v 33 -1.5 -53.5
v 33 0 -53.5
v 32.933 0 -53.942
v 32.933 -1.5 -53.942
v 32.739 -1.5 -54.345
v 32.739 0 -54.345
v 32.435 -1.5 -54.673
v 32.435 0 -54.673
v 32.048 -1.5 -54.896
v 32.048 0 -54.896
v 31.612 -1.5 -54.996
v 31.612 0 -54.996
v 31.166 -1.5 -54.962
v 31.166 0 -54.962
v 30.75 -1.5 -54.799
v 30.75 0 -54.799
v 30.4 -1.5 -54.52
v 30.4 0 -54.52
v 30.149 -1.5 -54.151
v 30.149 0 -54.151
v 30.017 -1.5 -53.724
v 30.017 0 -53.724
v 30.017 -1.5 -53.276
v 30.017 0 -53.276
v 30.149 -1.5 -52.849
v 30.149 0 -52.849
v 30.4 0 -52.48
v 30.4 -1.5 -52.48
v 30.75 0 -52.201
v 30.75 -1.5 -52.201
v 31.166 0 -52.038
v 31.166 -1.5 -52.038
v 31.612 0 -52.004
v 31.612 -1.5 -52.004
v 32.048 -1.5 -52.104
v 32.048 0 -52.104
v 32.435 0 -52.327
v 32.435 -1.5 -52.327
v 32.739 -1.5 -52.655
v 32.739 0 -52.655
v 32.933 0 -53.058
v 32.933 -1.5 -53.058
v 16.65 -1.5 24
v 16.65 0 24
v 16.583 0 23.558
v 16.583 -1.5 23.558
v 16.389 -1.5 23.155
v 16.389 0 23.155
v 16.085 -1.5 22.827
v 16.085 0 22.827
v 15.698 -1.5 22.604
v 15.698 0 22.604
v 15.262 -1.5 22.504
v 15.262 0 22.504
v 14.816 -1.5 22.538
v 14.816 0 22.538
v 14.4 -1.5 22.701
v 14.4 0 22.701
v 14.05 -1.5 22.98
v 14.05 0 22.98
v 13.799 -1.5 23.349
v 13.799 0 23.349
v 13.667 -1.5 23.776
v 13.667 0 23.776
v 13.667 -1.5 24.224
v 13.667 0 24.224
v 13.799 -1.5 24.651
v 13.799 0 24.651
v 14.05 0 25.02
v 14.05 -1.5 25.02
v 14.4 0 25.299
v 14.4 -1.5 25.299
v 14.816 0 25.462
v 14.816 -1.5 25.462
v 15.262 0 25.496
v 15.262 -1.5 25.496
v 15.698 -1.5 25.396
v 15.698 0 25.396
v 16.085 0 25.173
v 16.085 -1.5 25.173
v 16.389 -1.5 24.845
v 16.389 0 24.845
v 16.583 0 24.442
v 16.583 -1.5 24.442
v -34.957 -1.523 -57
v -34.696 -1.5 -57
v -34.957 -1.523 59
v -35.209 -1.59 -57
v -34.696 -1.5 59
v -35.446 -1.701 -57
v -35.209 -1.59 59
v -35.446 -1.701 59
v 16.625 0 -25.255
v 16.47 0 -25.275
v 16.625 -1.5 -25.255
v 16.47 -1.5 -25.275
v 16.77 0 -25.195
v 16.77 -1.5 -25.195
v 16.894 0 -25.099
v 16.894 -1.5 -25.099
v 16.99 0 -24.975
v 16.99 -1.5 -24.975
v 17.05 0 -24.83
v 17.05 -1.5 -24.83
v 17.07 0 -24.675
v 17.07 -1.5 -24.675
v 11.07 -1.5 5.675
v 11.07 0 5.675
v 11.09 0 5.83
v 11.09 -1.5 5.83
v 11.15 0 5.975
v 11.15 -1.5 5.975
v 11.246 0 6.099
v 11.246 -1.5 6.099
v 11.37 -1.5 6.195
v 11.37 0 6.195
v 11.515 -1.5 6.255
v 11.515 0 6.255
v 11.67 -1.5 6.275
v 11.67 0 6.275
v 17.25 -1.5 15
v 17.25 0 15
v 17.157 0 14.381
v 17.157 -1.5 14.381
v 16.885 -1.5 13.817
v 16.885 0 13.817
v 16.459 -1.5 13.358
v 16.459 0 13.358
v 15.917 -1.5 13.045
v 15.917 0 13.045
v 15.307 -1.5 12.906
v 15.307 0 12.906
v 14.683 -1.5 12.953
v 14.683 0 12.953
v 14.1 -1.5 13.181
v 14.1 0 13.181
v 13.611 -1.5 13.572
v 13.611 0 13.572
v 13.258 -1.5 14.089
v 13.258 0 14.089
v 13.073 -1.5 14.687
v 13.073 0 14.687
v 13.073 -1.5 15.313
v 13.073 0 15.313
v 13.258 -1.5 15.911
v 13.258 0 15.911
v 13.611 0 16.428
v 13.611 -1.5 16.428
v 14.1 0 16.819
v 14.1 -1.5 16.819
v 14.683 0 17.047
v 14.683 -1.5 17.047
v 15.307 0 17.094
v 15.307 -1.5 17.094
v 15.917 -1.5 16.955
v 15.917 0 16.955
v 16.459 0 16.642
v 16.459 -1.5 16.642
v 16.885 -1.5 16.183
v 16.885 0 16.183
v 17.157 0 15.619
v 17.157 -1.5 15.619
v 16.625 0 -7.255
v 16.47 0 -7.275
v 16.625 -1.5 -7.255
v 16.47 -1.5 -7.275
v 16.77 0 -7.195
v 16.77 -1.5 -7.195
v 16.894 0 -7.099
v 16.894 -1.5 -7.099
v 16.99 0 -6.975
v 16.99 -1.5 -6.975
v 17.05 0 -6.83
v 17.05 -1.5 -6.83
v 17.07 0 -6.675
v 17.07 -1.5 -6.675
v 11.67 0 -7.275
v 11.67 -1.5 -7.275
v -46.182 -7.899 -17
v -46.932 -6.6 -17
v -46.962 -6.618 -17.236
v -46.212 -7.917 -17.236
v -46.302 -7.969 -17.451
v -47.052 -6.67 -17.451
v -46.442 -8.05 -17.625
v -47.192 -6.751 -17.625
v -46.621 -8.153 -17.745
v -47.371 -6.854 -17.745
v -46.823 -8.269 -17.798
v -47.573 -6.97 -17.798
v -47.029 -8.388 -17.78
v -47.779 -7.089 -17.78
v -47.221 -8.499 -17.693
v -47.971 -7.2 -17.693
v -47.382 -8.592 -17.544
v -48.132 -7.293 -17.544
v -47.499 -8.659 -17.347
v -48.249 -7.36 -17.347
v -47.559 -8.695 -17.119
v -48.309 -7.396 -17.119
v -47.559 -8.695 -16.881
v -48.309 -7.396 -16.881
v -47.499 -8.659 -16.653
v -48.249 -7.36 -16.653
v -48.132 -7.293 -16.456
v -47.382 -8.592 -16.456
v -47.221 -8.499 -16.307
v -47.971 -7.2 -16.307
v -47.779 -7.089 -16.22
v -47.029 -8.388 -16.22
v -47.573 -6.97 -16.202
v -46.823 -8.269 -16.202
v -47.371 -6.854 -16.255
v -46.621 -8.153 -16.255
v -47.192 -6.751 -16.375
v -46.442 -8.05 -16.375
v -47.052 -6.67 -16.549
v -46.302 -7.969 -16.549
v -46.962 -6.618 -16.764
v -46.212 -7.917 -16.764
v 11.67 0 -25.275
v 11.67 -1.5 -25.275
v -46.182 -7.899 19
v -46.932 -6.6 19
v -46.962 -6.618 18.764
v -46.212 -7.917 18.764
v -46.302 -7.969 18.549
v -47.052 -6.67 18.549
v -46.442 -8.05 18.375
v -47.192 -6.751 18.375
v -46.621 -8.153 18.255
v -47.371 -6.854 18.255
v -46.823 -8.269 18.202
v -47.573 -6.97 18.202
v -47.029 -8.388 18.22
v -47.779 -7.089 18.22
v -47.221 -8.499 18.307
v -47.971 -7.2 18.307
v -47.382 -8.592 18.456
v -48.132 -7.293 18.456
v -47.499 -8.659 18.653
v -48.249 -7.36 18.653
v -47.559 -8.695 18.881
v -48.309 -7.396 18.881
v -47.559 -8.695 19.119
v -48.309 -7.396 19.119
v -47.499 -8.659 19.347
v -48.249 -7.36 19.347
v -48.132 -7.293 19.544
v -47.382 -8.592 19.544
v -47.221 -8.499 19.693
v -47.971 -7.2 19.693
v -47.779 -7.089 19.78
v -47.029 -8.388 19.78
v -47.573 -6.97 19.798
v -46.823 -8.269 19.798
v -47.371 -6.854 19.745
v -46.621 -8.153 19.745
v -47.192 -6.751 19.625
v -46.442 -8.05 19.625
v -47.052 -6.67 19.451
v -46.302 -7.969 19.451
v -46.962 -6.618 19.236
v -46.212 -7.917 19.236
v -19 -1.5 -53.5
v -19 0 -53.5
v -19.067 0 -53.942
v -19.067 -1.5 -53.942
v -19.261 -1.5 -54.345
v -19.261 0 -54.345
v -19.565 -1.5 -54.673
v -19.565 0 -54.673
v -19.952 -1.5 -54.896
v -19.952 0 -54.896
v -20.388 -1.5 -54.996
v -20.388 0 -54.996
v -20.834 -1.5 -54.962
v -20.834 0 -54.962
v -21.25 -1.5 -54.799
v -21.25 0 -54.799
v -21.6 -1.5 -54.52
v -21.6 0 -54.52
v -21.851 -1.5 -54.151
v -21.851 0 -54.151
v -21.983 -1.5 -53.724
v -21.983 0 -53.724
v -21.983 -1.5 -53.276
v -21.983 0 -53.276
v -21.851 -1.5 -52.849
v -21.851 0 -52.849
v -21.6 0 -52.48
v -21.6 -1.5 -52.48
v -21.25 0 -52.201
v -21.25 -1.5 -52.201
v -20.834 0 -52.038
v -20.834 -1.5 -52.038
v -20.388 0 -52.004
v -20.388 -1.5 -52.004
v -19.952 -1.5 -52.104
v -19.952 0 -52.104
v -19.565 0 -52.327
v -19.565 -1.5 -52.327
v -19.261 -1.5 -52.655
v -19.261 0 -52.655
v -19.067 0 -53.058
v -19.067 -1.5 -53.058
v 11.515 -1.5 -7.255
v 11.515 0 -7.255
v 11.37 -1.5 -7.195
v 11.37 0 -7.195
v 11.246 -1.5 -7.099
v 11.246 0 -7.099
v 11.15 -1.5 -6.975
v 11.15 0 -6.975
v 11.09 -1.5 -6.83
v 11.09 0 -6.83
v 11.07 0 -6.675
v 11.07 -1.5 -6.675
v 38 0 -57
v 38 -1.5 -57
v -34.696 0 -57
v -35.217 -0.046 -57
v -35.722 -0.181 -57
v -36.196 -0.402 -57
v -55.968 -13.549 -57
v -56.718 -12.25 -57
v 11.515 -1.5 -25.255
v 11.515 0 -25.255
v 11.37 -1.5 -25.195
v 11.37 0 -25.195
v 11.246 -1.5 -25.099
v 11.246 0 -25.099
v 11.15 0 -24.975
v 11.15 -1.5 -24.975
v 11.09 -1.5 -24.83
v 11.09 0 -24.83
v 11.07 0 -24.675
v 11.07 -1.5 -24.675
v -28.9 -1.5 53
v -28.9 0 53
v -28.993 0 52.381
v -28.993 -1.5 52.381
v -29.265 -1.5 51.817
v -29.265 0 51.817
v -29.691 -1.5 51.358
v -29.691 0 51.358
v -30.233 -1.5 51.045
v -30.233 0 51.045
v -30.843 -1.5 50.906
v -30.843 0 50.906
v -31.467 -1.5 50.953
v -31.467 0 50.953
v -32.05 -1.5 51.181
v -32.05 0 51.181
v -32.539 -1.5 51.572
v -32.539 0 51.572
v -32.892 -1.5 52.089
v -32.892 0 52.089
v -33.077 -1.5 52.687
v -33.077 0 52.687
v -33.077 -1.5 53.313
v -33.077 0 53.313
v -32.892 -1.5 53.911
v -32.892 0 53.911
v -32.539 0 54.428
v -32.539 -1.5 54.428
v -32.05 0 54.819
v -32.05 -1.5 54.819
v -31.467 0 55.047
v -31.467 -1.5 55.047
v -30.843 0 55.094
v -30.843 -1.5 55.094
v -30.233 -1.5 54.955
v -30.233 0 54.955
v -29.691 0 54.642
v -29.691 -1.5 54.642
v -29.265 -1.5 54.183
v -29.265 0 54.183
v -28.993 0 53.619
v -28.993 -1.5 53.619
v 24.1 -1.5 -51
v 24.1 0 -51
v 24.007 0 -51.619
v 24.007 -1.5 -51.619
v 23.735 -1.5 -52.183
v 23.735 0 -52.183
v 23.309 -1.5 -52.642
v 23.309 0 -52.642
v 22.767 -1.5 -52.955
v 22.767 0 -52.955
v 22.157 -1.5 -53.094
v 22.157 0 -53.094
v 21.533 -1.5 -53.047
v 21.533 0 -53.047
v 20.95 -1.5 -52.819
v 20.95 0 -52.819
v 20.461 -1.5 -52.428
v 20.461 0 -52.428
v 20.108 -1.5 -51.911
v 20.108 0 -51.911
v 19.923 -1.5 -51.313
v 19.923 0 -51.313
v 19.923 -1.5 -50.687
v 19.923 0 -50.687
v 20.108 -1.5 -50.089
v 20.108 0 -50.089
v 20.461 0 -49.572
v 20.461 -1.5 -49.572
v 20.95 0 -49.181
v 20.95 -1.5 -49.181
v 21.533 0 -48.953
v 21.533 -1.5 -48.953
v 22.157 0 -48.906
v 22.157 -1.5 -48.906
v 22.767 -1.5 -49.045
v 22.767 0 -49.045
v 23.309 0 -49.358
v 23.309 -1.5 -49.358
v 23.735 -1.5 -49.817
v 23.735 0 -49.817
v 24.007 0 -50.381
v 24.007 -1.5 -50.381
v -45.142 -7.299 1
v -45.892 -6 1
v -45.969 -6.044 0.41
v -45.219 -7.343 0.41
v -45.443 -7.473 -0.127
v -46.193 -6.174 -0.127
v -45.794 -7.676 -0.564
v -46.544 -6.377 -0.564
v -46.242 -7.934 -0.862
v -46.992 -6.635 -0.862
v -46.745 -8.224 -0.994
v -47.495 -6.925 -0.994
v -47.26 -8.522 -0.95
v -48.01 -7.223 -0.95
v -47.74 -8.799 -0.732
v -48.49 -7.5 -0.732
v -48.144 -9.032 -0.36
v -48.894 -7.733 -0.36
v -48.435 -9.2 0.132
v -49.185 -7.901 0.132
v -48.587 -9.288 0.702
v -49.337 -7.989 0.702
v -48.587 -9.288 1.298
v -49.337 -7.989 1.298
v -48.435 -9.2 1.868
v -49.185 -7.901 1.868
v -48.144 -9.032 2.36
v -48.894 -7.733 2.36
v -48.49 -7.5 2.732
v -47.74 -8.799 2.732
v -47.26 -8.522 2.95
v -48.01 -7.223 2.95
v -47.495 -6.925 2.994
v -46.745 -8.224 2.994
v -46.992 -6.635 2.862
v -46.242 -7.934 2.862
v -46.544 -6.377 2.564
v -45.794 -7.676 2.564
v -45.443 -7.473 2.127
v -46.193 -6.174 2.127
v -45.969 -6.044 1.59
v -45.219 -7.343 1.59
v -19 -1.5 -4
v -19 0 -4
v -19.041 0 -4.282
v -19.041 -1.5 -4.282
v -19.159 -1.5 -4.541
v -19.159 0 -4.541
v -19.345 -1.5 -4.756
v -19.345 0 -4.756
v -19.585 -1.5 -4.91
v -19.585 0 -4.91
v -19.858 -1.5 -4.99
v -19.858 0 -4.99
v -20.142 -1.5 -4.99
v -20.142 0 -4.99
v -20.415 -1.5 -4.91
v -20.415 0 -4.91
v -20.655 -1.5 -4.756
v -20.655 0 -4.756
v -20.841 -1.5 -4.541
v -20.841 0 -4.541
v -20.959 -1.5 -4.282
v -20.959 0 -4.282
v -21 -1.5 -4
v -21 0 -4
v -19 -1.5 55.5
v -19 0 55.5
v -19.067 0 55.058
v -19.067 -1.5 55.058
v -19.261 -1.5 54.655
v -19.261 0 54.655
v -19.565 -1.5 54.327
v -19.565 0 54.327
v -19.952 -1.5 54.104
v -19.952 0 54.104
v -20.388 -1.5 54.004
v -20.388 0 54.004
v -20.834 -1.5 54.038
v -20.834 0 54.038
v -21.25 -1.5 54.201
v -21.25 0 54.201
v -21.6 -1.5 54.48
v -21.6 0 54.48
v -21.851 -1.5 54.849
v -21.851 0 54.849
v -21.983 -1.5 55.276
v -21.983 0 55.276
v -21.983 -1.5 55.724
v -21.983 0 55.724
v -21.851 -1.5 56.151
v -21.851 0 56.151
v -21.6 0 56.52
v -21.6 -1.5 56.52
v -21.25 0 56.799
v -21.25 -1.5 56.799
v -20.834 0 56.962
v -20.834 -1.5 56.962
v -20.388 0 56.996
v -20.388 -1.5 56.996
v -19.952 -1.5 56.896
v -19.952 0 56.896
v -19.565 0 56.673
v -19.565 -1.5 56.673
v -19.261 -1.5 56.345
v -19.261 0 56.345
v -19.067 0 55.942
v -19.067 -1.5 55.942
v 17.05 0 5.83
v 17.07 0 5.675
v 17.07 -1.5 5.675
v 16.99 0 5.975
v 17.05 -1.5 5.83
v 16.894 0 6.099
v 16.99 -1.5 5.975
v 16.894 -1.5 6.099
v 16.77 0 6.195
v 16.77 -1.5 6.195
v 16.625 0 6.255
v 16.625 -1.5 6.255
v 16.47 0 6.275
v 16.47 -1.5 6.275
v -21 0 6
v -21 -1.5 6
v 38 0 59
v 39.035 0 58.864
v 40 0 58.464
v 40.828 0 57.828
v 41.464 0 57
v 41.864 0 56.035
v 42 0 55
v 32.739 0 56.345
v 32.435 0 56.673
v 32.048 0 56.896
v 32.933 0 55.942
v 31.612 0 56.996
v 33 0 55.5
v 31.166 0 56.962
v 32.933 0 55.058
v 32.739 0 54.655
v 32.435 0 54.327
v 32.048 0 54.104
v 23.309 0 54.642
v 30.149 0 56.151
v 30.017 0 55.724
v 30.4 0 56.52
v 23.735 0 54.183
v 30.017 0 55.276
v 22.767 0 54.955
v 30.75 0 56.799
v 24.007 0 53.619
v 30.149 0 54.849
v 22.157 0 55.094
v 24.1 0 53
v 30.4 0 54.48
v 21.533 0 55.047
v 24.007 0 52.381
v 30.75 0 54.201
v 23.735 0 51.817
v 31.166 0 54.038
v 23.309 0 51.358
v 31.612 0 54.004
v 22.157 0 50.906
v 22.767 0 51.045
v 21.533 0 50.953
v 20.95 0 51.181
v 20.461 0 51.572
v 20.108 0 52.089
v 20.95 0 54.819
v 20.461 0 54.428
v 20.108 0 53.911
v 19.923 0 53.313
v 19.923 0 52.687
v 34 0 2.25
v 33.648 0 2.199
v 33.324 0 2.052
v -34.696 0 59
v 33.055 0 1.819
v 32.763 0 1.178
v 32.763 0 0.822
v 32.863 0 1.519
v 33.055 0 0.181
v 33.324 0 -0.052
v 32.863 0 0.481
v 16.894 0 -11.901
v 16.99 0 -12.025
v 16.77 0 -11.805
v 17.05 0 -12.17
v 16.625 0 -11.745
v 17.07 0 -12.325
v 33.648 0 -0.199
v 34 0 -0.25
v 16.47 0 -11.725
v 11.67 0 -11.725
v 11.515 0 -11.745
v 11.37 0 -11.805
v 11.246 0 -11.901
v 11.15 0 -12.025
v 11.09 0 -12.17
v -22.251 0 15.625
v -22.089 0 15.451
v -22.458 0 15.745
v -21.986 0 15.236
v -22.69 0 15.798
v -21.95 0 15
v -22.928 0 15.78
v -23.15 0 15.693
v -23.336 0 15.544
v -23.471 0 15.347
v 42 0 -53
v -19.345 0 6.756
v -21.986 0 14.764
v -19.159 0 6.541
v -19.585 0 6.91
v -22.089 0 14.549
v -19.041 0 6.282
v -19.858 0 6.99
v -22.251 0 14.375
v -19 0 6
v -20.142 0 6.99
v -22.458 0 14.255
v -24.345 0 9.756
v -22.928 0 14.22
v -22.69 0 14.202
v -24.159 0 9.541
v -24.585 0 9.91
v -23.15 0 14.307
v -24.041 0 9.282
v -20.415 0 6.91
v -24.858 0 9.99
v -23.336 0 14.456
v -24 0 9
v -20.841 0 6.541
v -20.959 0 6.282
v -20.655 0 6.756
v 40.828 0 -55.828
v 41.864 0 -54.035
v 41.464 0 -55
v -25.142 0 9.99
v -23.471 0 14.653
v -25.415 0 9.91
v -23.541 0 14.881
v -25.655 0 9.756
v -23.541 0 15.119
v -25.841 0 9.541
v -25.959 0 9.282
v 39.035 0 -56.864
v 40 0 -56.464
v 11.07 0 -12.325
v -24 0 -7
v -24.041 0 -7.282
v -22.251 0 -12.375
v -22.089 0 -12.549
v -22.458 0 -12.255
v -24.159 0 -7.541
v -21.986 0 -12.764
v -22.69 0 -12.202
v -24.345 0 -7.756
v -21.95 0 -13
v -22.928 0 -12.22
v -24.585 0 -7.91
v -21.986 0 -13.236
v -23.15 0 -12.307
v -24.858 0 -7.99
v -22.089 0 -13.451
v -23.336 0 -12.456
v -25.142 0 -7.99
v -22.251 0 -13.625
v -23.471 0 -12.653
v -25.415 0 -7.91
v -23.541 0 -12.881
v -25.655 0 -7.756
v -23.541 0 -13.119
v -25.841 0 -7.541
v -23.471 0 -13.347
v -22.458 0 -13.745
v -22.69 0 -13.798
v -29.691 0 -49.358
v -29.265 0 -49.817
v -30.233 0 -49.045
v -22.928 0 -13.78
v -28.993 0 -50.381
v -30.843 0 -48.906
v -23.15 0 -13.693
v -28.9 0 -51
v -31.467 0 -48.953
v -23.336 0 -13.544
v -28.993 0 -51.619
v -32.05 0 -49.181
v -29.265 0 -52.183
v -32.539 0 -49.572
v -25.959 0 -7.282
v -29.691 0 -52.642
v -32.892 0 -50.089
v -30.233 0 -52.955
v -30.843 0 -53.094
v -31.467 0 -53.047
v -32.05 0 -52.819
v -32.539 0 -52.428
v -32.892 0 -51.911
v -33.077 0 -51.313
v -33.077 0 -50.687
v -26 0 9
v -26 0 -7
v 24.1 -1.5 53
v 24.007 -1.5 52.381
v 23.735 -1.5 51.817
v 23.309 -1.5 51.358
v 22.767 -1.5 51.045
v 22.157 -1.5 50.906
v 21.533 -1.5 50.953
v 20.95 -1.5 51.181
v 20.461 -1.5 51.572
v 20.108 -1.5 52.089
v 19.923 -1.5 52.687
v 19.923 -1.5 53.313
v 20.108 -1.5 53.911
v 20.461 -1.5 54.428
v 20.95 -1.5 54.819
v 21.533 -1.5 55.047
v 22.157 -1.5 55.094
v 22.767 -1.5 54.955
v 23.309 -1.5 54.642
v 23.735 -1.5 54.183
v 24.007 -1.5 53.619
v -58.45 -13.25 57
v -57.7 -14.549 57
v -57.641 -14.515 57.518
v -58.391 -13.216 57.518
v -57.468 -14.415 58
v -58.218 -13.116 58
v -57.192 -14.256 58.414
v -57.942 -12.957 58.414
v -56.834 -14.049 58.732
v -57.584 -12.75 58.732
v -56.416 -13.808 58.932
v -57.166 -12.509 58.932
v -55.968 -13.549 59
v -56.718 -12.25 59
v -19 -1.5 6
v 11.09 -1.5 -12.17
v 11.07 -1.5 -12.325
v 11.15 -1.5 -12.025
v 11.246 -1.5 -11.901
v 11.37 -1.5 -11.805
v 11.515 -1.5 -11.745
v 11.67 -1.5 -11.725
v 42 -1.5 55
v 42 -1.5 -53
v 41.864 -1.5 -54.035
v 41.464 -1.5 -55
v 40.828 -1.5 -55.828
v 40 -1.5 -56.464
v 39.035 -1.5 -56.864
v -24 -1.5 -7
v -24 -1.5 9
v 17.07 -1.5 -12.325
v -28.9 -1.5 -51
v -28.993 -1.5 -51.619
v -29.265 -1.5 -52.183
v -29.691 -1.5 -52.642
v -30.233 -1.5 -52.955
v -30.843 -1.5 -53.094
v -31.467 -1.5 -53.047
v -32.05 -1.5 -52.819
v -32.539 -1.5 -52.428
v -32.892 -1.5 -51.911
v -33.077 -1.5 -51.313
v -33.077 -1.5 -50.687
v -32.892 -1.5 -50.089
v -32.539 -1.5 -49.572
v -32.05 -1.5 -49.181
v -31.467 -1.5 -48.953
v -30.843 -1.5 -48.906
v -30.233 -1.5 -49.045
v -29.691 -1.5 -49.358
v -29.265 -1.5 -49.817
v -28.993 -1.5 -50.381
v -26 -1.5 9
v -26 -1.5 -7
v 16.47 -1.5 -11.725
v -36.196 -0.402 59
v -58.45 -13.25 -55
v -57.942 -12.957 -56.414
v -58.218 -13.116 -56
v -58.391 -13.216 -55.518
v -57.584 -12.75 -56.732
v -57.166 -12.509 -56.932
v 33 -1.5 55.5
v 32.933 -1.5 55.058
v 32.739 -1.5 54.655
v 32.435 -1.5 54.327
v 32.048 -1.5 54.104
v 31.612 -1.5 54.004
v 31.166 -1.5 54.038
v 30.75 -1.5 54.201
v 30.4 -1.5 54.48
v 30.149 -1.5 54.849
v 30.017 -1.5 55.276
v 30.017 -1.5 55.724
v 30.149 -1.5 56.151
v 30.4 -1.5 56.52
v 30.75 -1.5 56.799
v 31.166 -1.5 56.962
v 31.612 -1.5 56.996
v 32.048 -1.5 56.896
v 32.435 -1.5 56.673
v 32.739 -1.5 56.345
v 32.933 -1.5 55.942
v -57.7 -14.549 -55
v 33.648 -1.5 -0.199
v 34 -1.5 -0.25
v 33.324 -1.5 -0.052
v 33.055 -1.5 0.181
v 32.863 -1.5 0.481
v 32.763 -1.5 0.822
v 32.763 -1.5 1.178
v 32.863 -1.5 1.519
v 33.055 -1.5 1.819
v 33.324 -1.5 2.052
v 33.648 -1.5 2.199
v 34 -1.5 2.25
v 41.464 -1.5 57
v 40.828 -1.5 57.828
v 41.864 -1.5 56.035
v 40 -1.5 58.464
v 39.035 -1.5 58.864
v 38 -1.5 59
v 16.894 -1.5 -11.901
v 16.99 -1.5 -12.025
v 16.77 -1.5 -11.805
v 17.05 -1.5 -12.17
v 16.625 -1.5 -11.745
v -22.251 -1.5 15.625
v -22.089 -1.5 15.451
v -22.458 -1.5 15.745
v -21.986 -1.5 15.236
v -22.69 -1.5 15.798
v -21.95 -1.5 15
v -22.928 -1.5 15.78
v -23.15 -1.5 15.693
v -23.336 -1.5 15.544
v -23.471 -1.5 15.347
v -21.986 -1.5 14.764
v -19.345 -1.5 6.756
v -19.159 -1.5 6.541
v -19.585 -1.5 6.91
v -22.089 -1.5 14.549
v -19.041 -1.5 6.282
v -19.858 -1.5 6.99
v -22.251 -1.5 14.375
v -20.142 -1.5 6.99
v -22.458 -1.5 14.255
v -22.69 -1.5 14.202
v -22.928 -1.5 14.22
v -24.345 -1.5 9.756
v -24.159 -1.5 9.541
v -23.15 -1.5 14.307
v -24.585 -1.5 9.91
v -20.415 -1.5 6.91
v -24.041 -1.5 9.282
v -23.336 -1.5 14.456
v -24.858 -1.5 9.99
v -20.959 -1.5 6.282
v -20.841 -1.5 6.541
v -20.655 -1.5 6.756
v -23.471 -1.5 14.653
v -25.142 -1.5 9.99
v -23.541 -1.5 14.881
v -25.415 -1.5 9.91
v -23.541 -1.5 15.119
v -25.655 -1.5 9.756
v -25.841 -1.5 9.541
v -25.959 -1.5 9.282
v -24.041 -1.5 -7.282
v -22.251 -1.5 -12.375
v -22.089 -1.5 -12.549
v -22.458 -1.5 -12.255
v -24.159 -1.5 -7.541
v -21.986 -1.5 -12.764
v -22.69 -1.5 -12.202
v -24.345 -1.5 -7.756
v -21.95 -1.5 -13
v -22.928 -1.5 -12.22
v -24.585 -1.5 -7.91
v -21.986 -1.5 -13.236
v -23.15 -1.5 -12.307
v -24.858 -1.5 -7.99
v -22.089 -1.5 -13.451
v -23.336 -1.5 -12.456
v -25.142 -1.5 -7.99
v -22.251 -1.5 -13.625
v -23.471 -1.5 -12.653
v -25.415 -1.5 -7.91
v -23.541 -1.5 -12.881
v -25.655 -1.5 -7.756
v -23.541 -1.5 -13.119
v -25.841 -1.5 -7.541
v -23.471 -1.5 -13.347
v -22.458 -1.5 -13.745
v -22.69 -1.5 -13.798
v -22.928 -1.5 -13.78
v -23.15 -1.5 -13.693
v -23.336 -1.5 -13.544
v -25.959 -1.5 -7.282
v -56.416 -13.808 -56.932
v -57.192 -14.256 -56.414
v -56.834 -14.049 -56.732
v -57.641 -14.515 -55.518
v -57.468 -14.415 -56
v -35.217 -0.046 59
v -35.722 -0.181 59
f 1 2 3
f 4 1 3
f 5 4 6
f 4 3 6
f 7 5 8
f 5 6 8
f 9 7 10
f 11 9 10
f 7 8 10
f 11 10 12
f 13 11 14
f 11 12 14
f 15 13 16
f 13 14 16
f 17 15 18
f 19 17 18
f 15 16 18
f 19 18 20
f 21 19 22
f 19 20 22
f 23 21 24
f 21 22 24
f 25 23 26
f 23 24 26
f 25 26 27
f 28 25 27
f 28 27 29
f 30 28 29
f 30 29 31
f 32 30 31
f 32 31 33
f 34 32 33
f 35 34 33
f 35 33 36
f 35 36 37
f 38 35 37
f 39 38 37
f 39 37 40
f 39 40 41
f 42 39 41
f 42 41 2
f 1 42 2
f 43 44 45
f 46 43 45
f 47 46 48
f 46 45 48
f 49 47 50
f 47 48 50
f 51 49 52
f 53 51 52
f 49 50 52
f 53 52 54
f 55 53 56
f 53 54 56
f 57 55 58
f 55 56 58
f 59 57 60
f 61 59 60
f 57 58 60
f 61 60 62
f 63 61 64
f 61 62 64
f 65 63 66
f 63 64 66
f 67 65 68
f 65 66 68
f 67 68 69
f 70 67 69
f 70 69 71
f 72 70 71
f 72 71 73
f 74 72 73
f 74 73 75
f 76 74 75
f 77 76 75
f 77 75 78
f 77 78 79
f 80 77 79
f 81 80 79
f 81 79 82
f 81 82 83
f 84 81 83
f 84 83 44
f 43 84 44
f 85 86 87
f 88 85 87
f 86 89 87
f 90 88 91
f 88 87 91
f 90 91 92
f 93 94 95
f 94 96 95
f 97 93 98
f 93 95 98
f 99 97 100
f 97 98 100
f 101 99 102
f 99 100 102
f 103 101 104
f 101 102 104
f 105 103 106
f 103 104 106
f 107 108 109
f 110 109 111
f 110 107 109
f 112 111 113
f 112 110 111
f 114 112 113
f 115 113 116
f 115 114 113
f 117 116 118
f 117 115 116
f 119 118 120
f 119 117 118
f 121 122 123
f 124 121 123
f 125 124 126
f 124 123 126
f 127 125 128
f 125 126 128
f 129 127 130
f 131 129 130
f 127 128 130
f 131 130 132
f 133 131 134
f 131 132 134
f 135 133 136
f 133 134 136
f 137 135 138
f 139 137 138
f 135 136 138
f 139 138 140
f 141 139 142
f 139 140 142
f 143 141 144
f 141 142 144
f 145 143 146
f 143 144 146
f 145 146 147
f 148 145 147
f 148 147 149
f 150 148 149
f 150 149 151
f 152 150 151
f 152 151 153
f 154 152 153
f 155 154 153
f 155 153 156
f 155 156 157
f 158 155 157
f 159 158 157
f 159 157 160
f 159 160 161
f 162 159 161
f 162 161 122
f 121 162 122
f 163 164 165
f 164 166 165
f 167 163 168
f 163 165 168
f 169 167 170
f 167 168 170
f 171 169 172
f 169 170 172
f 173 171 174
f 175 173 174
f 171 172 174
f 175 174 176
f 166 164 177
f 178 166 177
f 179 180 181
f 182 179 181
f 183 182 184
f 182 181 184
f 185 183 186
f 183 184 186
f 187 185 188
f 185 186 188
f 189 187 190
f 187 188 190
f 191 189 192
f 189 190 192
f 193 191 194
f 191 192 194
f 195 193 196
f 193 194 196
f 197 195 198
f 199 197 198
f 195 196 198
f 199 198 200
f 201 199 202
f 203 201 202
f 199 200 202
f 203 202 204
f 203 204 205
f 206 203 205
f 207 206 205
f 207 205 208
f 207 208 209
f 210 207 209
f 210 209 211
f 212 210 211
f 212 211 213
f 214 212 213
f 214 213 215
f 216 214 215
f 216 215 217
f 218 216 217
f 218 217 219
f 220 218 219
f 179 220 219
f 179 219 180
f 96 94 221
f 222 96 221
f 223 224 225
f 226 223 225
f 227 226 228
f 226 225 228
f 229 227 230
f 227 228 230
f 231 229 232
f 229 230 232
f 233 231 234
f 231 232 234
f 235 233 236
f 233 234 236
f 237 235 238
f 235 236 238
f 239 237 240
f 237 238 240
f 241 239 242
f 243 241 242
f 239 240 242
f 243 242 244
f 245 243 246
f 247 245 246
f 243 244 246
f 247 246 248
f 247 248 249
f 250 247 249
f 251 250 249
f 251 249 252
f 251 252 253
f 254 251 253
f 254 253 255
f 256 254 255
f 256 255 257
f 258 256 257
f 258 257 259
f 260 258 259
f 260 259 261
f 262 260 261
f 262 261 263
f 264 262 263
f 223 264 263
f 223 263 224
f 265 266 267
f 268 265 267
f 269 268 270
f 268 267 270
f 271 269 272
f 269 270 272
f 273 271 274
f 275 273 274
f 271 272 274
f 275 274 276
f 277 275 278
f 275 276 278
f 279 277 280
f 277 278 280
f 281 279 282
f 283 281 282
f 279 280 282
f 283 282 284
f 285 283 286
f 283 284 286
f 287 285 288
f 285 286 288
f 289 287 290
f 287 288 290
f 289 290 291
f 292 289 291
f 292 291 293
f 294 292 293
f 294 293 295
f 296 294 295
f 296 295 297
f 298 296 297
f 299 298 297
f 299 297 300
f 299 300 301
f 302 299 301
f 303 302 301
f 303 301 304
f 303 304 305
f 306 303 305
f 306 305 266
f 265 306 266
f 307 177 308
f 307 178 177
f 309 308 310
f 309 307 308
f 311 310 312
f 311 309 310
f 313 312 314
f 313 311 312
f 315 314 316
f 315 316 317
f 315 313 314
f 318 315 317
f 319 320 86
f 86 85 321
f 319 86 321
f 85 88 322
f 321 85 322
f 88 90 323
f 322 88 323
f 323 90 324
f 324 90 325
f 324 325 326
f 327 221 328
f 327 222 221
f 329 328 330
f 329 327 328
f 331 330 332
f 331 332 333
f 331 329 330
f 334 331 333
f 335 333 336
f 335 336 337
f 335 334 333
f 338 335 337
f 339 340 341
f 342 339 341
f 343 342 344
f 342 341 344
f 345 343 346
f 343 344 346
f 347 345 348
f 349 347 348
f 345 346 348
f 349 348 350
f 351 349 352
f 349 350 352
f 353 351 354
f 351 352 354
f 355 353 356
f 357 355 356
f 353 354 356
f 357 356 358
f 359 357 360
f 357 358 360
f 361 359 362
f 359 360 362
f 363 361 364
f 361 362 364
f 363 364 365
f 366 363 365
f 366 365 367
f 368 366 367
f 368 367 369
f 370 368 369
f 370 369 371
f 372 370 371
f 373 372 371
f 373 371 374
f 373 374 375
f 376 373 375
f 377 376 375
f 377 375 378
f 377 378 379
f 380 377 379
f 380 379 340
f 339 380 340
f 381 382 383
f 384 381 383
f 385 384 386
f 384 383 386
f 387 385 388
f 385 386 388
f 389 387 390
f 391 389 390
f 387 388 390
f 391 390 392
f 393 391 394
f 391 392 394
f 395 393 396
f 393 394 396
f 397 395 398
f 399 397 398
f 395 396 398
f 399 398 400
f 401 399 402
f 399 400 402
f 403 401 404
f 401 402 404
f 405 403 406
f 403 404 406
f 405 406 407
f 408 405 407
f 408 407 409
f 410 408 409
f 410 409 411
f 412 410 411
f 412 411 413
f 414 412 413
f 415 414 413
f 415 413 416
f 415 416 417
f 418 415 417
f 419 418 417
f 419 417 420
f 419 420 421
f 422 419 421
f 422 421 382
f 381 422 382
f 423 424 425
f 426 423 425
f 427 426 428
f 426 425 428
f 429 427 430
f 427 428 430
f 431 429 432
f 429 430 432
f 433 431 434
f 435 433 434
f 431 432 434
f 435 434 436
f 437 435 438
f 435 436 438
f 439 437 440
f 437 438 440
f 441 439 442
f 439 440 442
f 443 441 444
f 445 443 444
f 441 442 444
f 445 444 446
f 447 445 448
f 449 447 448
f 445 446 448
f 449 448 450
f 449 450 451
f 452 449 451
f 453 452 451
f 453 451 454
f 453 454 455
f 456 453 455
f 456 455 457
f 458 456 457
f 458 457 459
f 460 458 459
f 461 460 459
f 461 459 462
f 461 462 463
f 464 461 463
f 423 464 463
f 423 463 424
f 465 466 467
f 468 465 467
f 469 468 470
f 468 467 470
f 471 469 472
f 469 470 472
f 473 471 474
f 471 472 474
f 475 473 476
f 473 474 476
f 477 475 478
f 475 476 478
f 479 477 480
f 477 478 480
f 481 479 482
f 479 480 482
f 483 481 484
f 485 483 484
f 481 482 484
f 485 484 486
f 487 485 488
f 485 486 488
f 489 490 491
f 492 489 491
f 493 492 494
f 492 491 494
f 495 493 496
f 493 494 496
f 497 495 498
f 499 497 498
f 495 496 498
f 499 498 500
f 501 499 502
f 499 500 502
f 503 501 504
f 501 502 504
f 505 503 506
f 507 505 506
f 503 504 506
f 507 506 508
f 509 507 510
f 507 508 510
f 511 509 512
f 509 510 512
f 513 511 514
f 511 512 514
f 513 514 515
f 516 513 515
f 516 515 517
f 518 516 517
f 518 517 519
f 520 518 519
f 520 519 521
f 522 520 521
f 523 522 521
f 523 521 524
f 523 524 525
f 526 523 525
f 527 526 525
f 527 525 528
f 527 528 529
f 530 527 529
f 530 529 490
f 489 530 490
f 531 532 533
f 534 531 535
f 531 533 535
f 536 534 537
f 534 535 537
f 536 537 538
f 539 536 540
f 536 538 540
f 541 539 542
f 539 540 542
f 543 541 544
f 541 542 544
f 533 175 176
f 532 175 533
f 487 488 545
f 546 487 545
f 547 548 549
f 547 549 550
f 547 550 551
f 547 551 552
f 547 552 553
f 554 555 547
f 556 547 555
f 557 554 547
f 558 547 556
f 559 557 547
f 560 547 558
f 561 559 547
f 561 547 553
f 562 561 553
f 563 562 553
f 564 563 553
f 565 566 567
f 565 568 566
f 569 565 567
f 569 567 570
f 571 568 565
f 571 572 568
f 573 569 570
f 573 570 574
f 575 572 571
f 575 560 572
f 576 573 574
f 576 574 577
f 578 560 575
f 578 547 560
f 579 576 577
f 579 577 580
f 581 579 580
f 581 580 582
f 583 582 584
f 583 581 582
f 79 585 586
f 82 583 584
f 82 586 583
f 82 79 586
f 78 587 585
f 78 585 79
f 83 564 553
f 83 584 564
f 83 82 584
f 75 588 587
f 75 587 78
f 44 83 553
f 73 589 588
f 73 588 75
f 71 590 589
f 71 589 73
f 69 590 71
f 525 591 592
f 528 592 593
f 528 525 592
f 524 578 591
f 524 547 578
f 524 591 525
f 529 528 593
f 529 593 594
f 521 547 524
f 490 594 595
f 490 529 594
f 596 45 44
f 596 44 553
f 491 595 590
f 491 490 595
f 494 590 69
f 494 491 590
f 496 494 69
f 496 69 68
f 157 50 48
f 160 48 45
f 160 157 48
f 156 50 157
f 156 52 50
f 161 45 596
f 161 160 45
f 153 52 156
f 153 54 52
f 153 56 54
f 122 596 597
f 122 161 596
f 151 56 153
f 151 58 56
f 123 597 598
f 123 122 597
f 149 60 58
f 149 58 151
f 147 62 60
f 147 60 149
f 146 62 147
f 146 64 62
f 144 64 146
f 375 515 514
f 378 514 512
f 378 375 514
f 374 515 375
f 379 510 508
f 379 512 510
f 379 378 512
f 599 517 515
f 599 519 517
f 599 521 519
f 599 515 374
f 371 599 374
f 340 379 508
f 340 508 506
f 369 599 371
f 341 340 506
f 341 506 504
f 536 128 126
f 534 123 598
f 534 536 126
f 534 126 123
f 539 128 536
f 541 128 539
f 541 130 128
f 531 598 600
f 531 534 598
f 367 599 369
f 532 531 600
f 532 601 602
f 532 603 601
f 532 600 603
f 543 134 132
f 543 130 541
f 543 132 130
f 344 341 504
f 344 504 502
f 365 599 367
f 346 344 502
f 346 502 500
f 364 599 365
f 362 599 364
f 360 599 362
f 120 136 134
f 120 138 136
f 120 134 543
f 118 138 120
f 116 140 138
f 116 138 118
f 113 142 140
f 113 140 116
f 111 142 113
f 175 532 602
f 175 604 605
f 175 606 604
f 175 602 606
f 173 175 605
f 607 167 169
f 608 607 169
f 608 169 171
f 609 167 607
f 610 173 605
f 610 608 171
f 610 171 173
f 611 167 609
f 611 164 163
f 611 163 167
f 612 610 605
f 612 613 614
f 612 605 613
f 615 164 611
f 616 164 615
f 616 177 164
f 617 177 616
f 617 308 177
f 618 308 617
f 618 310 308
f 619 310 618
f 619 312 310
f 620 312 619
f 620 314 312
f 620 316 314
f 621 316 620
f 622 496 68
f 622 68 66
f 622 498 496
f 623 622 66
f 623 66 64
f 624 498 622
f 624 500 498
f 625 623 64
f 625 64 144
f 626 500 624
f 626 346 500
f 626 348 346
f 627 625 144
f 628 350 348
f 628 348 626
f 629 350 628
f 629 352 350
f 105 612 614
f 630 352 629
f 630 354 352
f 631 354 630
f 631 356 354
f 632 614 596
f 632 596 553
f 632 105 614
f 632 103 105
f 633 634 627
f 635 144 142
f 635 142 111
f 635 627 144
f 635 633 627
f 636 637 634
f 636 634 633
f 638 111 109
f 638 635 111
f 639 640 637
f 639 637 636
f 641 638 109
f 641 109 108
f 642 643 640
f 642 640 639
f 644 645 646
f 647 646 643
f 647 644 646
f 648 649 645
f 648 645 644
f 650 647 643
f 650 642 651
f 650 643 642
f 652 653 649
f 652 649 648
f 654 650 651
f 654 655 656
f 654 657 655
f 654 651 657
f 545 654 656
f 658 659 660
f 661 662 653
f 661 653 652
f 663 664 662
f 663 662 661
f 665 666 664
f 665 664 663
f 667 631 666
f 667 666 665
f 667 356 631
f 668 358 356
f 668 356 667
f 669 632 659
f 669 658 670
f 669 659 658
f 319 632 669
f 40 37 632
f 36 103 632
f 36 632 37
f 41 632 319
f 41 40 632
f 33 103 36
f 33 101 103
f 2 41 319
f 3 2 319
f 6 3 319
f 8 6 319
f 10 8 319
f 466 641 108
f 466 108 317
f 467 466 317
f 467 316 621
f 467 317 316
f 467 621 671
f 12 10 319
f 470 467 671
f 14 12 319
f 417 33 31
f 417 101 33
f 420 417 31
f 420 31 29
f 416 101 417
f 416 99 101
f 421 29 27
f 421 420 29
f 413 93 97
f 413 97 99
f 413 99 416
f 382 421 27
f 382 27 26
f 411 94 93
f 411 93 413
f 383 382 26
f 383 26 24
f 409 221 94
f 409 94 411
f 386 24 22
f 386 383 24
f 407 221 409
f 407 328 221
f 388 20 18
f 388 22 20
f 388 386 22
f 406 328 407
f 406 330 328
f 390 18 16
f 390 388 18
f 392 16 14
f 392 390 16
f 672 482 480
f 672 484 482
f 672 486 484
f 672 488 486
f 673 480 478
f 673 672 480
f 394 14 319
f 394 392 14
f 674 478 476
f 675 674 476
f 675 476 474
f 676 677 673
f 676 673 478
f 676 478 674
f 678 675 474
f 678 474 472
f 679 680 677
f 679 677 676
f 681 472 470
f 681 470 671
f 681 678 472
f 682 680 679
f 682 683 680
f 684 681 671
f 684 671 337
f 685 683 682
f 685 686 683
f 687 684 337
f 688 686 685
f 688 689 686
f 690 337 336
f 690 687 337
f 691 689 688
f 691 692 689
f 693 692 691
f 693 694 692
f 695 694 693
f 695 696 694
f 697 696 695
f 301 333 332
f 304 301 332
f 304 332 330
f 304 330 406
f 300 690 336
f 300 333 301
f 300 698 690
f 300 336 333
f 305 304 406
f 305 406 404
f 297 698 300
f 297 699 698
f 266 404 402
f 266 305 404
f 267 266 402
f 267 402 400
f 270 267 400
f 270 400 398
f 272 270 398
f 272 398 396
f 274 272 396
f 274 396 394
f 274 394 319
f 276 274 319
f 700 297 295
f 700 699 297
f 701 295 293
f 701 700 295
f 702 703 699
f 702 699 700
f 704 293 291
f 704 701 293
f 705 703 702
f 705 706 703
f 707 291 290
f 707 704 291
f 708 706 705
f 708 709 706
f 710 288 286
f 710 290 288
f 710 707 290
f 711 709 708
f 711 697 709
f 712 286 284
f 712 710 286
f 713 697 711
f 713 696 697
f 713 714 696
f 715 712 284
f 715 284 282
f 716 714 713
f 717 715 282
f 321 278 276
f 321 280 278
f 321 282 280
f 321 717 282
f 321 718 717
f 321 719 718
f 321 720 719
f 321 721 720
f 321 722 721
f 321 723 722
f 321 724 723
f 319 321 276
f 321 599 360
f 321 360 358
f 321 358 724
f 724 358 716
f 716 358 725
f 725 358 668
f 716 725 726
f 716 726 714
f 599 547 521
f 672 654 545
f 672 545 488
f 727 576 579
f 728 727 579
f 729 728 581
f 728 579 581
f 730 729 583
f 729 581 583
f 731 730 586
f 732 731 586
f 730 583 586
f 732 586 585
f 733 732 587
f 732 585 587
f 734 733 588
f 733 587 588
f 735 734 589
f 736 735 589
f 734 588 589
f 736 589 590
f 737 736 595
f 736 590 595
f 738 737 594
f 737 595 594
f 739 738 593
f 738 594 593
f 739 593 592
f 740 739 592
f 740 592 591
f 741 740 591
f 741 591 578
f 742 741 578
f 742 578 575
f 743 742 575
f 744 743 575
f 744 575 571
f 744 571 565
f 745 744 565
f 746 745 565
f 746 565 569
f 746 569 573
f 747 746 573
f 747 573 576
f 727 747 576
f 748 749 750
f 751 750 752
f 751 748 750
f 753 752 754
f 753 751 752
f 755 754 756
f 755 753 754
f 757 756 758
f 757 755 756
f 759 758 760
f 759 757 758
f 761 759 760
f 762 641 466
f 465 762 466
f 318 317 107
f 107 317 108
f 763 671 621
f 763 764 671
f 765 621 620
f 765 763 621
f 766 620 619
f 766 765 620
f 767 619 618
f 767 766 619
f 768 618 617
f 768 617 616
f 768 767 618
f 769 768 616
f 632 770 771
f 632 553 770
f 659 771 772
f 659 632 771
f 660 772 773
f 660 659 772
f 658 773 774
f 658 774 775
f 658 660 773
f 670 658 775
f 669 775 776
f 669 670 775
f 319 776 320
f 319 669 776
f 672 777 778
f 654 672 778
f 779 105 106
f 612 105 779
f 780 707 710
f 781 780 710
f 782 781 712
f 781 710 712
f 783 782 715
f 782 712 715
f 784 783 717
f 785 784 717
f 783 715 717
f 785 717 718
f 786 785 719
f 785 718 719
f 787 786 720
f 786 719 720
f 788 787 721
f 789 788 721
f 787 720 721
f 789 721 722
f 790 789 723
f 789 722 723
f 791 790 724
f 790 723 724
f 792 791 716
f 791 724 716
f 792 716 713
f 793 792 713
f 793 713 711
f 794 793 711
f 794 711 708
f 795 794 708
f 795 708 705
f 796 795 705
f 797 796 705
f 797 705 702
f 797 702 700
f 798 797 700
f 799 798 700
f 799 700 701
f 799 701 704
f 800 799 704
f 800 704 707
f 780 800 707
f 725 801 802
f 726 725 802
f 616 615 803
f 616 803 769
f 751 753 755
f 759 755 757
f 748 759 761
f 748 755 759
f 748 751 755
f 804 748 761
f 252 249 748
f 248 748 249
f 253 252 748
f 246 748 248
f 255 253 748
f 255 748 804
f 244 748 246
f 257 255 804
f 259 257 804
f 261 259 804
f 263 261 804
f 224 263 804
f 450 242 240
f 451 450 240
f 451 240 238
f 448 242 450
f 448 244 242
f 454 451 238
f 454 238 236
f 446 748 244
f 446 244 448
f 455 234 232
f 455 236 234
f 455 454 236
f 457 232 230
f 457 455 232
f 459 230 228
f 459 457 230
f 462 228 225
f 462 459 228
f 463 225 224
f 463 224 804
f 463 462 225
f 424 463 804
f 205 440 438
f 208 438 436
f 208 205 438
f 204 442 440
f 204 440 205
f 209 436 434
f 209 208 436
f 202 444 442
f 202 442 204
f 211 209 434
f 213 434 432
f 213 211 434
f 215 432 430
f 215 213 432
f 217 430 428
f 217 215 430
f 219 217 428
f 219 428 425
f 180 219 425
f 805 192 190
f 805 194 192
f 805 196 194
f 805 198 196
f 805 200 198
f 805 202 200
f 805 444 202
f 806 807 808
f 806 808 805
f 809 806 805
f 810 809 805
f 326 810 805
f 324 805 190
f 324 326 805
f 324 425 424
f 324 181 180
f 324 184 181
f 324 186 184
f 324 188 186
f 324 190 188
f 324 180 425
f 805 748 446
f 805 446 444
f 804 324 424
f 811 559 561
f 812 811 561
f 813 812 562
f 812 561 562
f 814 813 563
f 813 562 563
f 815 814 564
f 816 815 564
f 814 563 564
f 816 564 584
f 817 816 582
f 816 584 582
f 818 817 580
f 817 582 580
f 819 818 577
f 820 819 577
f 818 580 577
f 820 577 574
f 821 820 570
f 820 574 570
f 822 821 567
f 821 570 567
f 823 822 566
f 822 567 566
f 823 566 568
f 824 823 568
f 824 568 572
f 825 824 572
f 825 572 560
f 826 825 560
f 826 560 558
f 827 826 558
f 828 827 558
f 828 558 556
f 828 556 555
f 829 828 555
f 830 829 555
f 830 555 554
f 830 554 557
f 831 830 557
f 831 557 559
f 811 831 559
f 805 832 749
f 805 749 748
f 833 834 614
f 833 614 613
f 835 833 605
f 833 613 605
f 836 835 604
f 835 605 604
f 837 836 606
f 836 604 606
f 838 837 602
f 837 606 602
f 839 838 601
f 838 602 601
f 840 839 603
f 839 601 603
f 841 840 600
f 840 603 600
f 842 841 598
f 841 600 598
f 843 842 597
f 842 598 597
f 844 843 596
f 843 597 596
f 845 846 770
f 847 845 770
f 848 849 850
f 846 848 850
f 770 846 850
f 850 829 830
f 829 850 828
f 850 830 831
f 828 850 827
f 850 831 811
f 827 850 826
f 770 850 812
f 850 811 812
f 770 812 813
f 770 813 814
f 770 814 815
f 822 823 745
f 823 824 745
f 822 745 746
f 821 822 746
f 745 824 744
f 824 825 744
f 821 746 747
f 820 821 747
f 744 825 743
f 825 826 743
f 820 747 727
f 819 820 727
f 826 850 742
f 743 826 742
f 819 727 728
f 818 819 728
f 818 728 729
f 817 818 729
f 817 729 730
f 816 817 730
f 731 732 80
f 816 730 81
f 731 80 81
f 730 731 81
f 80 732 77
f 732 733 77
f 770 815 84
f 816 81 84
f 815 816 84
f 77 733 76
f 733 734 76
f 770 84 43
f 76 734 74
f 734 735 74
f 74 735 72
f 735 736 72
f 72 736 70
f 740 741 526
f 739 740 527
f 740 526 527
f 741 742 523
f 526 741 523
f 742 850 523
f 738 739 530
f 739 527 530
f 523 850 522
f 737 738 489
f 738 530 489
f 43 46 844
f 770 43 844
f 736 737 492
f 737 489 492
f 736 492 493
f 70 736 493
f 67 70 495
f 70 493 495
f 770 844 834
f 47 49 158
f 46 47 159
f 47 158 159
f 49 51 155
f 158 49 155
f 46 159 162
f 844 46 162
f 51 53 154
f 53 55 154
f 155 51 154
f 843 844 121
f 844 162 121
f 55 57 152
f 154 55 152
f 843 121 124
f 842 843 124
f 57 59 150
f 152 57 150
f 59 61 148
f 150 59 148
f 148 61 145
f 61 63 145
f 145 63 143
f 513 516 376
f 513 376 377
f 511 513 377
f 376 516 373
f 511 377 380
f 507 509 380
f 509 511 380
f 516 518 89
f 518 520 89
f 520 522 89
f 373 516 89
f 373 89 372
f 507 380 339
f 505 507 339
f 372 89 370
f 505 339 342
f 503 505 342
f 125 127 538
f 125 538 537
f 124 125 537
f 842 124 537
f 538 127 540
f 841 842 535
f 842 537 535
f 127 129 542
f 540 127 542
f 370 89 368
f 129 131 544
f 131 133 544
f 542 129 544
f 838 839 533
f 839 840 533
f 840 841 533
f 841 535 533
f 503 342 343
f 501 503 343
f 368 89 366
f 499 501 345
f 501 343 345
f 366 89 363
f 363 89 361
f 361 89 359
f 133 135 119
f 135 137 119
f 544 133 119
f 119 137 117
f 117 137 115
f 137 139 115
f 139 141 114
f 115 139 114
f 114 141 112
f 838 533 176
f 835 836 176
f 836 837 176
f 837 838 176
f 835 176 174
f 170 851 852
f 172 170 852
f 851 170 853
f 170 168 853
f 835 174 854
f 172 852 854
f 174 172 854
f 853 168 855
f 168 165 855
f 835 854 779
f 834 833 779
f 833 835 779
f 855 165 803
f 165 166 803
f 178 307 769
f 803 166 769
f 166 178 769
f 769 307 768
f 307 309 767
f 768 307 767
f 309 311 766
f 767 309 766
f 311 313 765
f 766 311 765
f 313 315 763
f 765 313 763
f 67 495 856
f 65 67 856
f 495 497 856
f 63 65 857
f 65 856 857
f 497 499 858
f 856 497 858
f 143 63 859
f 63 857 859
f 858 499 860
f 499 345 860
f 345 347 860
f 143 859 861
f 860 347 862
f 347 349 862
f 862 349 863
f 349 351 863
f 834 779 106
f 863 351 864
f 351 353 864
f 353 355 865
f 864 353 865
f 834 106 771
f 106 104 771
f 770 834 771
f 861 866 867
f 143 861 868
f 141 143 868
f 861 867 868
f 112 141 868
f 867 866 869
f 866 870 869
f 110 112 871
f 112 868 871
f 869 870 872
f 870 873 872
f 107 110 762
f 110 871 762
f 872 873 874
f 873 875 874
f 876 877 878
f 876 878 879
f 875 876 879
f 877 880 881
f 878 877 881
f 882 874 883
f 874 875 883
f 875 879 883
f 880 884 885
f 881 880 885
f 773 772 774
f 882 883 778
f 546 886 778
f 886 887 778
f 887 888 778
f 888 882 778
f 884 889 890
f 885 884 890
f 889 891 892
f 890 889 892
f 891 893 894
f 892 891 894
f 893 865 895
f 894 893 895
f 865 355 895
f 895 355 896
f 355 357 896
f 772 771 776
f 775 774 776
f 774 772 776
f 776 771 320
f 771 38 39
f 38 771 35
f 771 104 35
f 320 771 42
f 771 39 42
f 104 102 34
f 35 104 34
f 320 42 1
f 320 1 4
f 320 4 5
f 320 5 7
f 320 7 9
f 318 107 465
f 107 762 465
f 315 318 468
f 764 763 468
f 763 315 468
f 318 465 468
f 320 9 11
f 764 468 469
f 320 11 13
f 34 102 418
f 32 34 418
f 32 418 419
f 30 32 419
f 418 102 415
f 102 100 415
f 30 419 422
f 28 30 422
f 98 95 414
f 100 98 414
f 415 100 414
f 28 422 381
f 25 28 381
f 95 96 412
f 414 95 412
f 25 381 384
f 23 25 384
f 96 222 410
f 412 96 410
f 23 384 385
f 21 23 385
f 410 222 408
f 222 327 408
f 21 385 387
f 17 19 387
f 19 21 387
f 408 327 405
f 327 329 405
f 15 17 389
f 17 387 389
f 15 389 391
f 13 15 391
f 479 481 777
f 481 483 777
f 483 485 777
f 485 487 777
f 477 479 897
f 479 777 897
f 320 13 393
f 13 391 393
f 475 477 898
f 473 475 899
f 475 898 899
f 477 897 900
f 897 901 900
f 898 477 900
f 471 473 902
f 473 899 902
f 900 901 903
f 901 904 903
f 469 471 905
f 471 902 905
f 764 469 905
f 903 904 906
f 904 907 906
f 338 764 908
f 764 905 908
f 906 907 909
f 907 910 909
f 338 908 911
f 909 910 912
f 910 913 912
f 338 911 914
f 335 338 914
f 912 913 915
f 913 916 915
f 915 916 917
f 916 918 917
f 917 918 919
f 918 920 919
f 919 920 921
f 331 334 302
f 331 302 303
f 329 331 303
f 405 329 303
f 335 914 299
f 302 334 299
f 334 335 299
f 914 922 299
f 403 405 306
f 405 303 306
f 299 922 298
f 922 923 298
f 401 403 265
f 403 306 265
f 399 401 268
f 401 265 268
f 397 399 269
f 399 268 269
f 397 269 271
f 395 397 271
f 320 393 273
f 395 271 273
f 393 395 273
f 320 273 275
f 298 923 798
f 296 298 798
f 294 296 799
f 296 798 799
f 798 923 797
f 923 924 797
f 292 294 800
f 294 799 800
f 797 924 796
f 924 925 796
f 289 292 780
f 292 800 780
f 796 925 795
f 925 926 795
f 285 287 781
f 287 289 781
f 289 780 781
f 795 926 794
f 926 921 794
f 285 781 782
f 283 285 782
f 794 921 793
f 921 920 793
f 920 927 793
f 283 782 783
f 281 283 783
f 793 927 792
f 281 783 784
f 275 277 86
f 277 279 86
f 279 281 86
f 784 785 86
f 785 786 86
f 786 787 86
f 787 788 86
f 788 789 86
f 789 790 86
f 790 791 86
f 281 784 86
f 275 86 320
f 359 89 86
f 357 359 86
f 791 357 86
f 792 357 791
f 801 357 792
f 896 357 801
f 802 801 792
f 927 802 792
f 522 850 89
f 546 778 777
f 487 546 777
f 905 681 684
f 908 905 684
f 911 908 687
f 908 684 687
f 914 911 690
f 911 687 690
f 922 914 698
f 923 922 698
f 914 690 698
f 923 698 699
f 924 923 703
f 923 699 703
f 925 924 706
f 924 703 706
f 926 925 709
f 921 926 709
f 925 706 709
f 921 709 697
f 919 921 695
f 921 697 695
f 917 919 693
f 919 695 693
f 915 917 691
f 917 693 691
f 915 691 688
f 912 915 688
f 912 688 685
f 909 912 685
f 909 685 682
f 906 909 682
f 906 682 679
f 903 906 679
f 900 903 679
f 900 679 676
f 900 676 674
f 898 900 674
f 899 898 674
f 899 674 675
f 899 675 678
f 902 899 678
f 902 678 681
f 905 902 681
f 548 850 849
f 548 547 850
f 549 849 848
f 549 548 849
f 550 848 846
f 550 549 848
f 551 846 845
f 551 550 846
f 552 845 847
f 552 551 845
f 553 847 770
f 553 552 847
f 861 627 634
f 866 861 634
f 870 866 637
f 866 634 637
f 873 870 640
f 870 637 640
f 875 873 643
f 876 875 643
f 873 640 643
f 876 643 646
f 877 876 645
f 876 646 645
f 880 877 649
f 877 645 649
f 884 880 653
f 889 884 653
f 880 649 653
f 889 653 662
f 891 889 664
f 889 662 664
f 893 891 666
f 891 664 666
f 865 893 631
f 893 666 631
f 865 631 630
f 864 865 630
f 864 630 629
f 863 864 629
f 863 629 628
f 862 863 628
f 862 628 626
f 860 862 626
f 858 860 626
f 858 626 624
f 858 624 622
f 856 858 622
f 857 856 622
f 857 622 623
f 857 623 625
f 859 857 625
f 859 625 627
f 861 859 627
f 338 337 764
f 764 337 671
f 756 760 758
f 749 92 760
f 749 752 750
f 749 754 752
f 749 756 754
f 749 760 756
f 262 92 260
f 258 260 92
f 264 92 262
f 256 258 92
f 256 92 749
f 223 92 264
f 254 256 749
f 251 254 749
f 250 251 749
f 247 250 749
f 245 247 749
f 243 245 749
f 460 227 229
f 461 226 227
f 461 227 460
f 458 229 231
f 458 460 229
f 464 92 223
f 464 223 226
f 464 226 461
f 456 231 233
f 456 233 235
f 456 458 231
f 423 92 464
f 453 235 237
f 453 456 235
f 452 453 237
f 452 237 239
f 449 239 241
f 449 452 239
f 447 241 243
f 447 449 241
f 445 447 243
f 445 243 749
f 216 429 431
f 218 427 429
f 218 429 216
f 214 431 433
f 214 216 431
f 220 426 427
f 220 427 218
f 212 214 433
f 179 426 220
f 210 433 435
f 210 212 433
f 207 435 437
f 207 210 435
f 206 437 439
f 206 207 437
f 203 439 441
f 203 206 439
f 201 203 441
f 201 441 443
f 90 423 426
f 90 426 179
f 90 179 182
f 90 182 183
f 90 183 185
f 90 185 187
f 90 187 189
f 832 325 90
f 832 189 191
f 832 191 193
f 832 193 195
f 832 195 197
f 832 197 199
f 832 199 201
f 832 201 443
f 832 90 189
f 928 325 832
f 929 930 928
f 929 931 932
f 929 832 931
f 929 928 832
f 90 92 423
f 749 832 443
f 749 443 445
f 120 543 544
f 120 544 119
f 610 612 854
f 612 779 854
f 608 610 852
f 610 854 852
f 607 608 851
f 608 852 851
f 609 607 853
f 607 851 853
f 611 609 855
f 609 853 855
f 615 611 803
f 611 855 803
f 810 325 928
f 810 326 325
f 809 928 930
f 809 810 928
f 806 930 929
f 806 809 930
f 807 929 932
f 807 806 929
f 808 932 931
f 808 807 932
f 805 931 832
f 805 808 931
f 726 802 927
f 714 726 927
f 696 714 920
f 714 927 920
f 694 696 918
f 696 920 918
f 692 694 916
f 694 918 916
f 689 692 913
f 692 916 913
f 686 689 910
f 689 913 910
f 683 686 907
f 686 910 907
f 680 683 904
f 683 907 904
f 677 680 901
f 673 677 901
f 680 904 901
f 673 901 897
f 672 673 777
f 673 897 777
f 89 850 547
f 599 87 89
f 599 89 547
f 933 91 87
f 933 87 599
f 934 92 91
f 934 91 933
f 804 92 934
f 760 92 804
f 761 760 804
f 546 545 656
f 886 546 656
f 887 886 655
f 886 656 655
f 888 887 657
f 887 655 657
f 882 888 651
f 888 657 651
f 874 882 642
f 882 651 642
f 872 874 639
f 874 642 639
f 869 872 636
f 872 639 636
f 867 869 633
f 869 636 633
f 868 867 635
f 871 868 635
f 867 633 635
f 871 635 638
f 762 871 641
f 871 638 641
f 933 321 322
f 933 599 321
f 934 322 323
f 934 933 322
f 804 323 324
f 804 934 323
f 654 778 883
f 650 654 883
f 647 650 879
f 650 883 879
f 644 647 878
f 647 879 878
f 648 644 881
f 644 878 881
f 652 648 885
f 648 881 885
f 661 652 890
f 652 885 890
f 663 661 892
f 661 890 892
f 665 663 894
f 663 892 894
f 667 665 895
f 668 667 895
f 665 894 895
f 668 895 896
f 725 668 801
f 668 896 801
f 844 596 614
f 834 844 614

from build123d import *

# Parameters (mm, degrees)
SALIENTE_EXTRUIR1_DEPTH             = 116
CROQUIS2_W                          = 6
CROQUIS2_H                          = 13.55
CORTAR_EXTRUIR1_DEPTH               = 85.315116124
CROQUIS3_W                          = 6
CROQUIS3_H                          = 13.55
CORTAR_EXTRUIR2_DEPTH               = 85.315116124
CORTAR_EXTRUIR3_DEPTH               = 85.315116124
CORTAR_EXTRUIR4_DEPTH               = 85.069267231
DI_METRO_DE_TALADRO_2_5_2_5_1_D     = 2.5
DI_METRO_DE_TALADRO_3_0_3_1_D       = 3
DI_METRO_DE_TALADRO_1_6_1_6_1_D     = 1.6
DI_METRO_DE_TALADRO_4_0_4_1_D       = 4
DI_METRO_DE_TALADRO_4_0_4_1_DEPTH   = 12.9748366
DI_METRO_DE_TALADRO_1_6_1_6_2_D     = 1.6
DI_METRO_DE_TALADRO_1_6_1_6_2_DEPTH = 12.9748366
DI_METRO_DE_TALADRO_4_2_4_2_1_D     = 4.2
REDONDEO1_R                         = 0.6
REDONDEO2_R                         = 1.5
REDONDEO3_R                         = 2
REDONDEO4_R                         = 3
SALIENTE_EXTRUIR2_DEPTH             = 4
SALIENTE_EXTRUIR2_DEPTH_BACK        = 4
CROQUIS18_W                         = 116
CROQUIS18_H                         = 1.5
REDONDEO5_R                         = 4


with BuildPart() as part:
    # Croquis1 → Saliente-Extruir1 (new body)
    with BuildSketch(Plane(origin=(0, 0, -57), x_dir=(-1, 0, 0), z_dir=(0, 0, -1))):
        Polygon((58.4496732, -13.25), (35.5, 0), (-38, 0), (-38, -1.5), (35.098076211, -1.5), (57.6996732, -14.549038106), align=None)
    extrude(amount=-SALIENTE_EXTRUIR1_DEPTH)

    # Croquis2 → Cortar-Extruir1 (cut, through all)
    with BuildSketch(Plane(origin=(0, 0, 0), x_dir=(-1, 0, 0), z_dir=(0, 1, 0))):
        with Locations((-14.07, -18.5)):
            Rectangle(CROQUIS2_W, CROQUIS2_H)
    extrude(amount=-CORTAR_EXTRUIR1_DEPTH, mode=Mode.SUBTRACT)

    # Croquis3 → Cortar-Extruir2 (cut, through all)
    with BuildSketch(Plane(origin=(0, 0, 0), x_dir=(-1, 0, 0), z_dir=(0, 1, 0))):
        with Locations((-14.07, -0.5)):
            Rectangle(CROQUIS3_W, CROQUIS3_H)
    extrude(amount=-CORTAR_EXTRUIR2_DEPTH, mode=Mode.SUBTRACT)

    # Croquis4 → Cortar-Extruir3 (cut, through all)
    with BuildSketch(Plane(origin=(0, 0, 0), x_dir=(-1, 0, 0), z_dir=(0, 1, 0))):
        with BuildLine():
            Line((21, -4), (21, 6))
            ThreePointArc((21, 6), (20, 7), (19, 6))
            Line((19, 6), (19, -4))
            ThreePointArc((19, -4), (20, -5), (21, -4))
        make_face()
    extrude(amount=-CORTAR_EXTRUIR3_DEPTH, mode=Mode.SUBTRACT)

    # Croquis5 → Cortar-Extruir4 (cut, through all)
    with BuildSketch(Plane.XZ.offset(1.5)):
        with BuildLine():
            Line((-24, -7), (-24, 9))
            ThreePointArc((-24, 9), (-25, 10), (-26, 9))
            Line((-26, 9), (-26, -7))
            ThreePointArc((-26, -7), (-25, -8), (-24, -7))
        make_face()
    extrude(amount=-CORTAR_EXTRUIR4_DEPTH, mode=Mode.SUBTRACT)

    # Diámetro de taladro Ø2.5 (2.5)1 (through all)
    with Locations(Plane(origin=(0, -1.5, 0), x_dir=(-1, 0, 0), z_dir=(0, -1, 0))):
        with Locations((-34, -1)):
            Hole(DI_METRO_DE_TALADRO_2_5_2_5_1_D / 2)

    # Diámetro de taladro Ø3.0 (3)1 (through all)
    with Locations(Plane(origin=(0, -1.5, 0), x_dir=(-1, 0, 0), z_dir=(0, -1, 0))):
        with Locations((-15.15, -24), (-31.5, 53.5), (20.5, -55.5), (-31.5, -55.5), (20.5, 53.5)):
            Hole(DI_METRO_DE_TALADRO_3_0_3_1_D / 2)

    # Diámetro de taladro Ø1.6 (1.6)1 (through all)
    with Locations(Plane(origin=(0, -1.5, 0), x_dir=(-1, 0, 0), z_dir=(0, -1, 0))):
        with Locations((22.75, -15), (22.75, 13)):
            Hole(DI_METRO_DE_TALADRO_1_6_1_6_1_D / 2)

    # Diámetro de taladro Ø4.0 (4)1
    with Locations(Plane(origin=(-8.125, 14.072912811, 0), x_dir=(-0.8660254037844288, -0.5000000000000172, 0), z_dir=(0.5000000000000172, -0.8660254037844288, 0))):
        with Locations((44.743901834, -1)):
            Hole(DI_METRO_DE_TALADRO_4_0_4_1_D / 2, depth=DI_METRO_DE_TALADRO_4_0_4_1_DEPTH)

    # Diámetro de taladro Ø1.6 (1.6)2
    with Locations(Plane(origin=(-8.125, 14.072912811, 0), x_dir=(-0.8660254037844288, -0.5000000000000172, 0), z_dir=(0.5000000000000172, -0.8660254037844288, 0))):
        with Locations((44.743901834, -19), (44.743901834, 17)):
            Hole(DI_METRO_DE_TALADRO_1_6_1_6_2_D / 2, depth=DI_METRO_DE_TALADRO_1_6_1_6_2_DEPTH)

    # Diámetro de taladro Ø4.2 (4.2)1 (through all)
    with Locations(Plane(origin=(0, -1.5, 0), x_dir=(-1, 0, 0), z_dir=(0, -1, 0))):
        with Locations((31, -53), (31, 51), (-22, -53), (-22, 51), (-15.15, -15)):
            Hole(DI_METRO_DE_TALADRO_4_2_4_2_1_D / 2)

    # Redondeo1
    redondeo1_edges = [part.edges().sort_by_distance(p)[0] for p in [
        (17.07, -0.75, -25.275),
        (17.07, -0.75, -11.725),
        (11.07, -0.75, -11.725),
        (11.07, -0.75, -25.275),
        (11.07, -0.75, -7.275),
        (17.07, -0.75, -7.275),
        (17.07, -0.75, 6.275),
        (11.07, -0.75, 6.275),
    ]]
    fillet(redondeo1_edges, radius=REDONDEO1_R)

    # Redondeo2
    redondeo2_edges = [part.edges().sort_by_distance(p)[0] for p in [
        (-35.098076211, -1.5, 1),
    ]]
    fillet(redondeo2_edges, radius=REDONDEO2_R)

    # Redondeo3
    redondeo3_edges = [part.edges().sort_by_distance(p)[0] for p in [
        (38, -0.75, 59),
        (-58.0746732, -13.899519053, 59),
        (38, -0.75, -57),
        (-58.0746732, -13.899519053, -57),
    ]]
    fillet(redondeo3_edges, radius=REDONDEO3_R)

    # Redondeo4
    redondeo4_edges = [part.edges().sort_by_distance(p)[0] for p in [
        (-35.5, 0, 1),
    ]]
    fillet(redondeo4_edges, radius=REDONDEO4_R)

    # Croquis18 → Saliente-Extruir2 (add, two sides: drawn at the far end of the back side and taken through both)
    with BuildSketch(Plane(origin=(38, 0, 0), x_dir=(0, 0, -1), z_dir=(1, 0, 0)).offset(-SALIENTE_EXTRUIR2_DEPTH_BACK)):
        with Locations((-1, -0.75)):
            Rectangle(CROQUIS18_W, CROQUIS18_H)
    extrude(amount=SALIENTE_EXTRUIR2_DEPTH + SALIENTE_EXTRUIR2_DEPTH_BACK)

    # Redondeo5
    redondeo5_edges = [part.edges().sort_by_distance(p)[0] for p in [
        (42, -0.75, 59),
        (42, -0.75, -57),
    ]]
    fillet(redondeo5_edges, radius=REDONDEO5_R)


solid = part.part
